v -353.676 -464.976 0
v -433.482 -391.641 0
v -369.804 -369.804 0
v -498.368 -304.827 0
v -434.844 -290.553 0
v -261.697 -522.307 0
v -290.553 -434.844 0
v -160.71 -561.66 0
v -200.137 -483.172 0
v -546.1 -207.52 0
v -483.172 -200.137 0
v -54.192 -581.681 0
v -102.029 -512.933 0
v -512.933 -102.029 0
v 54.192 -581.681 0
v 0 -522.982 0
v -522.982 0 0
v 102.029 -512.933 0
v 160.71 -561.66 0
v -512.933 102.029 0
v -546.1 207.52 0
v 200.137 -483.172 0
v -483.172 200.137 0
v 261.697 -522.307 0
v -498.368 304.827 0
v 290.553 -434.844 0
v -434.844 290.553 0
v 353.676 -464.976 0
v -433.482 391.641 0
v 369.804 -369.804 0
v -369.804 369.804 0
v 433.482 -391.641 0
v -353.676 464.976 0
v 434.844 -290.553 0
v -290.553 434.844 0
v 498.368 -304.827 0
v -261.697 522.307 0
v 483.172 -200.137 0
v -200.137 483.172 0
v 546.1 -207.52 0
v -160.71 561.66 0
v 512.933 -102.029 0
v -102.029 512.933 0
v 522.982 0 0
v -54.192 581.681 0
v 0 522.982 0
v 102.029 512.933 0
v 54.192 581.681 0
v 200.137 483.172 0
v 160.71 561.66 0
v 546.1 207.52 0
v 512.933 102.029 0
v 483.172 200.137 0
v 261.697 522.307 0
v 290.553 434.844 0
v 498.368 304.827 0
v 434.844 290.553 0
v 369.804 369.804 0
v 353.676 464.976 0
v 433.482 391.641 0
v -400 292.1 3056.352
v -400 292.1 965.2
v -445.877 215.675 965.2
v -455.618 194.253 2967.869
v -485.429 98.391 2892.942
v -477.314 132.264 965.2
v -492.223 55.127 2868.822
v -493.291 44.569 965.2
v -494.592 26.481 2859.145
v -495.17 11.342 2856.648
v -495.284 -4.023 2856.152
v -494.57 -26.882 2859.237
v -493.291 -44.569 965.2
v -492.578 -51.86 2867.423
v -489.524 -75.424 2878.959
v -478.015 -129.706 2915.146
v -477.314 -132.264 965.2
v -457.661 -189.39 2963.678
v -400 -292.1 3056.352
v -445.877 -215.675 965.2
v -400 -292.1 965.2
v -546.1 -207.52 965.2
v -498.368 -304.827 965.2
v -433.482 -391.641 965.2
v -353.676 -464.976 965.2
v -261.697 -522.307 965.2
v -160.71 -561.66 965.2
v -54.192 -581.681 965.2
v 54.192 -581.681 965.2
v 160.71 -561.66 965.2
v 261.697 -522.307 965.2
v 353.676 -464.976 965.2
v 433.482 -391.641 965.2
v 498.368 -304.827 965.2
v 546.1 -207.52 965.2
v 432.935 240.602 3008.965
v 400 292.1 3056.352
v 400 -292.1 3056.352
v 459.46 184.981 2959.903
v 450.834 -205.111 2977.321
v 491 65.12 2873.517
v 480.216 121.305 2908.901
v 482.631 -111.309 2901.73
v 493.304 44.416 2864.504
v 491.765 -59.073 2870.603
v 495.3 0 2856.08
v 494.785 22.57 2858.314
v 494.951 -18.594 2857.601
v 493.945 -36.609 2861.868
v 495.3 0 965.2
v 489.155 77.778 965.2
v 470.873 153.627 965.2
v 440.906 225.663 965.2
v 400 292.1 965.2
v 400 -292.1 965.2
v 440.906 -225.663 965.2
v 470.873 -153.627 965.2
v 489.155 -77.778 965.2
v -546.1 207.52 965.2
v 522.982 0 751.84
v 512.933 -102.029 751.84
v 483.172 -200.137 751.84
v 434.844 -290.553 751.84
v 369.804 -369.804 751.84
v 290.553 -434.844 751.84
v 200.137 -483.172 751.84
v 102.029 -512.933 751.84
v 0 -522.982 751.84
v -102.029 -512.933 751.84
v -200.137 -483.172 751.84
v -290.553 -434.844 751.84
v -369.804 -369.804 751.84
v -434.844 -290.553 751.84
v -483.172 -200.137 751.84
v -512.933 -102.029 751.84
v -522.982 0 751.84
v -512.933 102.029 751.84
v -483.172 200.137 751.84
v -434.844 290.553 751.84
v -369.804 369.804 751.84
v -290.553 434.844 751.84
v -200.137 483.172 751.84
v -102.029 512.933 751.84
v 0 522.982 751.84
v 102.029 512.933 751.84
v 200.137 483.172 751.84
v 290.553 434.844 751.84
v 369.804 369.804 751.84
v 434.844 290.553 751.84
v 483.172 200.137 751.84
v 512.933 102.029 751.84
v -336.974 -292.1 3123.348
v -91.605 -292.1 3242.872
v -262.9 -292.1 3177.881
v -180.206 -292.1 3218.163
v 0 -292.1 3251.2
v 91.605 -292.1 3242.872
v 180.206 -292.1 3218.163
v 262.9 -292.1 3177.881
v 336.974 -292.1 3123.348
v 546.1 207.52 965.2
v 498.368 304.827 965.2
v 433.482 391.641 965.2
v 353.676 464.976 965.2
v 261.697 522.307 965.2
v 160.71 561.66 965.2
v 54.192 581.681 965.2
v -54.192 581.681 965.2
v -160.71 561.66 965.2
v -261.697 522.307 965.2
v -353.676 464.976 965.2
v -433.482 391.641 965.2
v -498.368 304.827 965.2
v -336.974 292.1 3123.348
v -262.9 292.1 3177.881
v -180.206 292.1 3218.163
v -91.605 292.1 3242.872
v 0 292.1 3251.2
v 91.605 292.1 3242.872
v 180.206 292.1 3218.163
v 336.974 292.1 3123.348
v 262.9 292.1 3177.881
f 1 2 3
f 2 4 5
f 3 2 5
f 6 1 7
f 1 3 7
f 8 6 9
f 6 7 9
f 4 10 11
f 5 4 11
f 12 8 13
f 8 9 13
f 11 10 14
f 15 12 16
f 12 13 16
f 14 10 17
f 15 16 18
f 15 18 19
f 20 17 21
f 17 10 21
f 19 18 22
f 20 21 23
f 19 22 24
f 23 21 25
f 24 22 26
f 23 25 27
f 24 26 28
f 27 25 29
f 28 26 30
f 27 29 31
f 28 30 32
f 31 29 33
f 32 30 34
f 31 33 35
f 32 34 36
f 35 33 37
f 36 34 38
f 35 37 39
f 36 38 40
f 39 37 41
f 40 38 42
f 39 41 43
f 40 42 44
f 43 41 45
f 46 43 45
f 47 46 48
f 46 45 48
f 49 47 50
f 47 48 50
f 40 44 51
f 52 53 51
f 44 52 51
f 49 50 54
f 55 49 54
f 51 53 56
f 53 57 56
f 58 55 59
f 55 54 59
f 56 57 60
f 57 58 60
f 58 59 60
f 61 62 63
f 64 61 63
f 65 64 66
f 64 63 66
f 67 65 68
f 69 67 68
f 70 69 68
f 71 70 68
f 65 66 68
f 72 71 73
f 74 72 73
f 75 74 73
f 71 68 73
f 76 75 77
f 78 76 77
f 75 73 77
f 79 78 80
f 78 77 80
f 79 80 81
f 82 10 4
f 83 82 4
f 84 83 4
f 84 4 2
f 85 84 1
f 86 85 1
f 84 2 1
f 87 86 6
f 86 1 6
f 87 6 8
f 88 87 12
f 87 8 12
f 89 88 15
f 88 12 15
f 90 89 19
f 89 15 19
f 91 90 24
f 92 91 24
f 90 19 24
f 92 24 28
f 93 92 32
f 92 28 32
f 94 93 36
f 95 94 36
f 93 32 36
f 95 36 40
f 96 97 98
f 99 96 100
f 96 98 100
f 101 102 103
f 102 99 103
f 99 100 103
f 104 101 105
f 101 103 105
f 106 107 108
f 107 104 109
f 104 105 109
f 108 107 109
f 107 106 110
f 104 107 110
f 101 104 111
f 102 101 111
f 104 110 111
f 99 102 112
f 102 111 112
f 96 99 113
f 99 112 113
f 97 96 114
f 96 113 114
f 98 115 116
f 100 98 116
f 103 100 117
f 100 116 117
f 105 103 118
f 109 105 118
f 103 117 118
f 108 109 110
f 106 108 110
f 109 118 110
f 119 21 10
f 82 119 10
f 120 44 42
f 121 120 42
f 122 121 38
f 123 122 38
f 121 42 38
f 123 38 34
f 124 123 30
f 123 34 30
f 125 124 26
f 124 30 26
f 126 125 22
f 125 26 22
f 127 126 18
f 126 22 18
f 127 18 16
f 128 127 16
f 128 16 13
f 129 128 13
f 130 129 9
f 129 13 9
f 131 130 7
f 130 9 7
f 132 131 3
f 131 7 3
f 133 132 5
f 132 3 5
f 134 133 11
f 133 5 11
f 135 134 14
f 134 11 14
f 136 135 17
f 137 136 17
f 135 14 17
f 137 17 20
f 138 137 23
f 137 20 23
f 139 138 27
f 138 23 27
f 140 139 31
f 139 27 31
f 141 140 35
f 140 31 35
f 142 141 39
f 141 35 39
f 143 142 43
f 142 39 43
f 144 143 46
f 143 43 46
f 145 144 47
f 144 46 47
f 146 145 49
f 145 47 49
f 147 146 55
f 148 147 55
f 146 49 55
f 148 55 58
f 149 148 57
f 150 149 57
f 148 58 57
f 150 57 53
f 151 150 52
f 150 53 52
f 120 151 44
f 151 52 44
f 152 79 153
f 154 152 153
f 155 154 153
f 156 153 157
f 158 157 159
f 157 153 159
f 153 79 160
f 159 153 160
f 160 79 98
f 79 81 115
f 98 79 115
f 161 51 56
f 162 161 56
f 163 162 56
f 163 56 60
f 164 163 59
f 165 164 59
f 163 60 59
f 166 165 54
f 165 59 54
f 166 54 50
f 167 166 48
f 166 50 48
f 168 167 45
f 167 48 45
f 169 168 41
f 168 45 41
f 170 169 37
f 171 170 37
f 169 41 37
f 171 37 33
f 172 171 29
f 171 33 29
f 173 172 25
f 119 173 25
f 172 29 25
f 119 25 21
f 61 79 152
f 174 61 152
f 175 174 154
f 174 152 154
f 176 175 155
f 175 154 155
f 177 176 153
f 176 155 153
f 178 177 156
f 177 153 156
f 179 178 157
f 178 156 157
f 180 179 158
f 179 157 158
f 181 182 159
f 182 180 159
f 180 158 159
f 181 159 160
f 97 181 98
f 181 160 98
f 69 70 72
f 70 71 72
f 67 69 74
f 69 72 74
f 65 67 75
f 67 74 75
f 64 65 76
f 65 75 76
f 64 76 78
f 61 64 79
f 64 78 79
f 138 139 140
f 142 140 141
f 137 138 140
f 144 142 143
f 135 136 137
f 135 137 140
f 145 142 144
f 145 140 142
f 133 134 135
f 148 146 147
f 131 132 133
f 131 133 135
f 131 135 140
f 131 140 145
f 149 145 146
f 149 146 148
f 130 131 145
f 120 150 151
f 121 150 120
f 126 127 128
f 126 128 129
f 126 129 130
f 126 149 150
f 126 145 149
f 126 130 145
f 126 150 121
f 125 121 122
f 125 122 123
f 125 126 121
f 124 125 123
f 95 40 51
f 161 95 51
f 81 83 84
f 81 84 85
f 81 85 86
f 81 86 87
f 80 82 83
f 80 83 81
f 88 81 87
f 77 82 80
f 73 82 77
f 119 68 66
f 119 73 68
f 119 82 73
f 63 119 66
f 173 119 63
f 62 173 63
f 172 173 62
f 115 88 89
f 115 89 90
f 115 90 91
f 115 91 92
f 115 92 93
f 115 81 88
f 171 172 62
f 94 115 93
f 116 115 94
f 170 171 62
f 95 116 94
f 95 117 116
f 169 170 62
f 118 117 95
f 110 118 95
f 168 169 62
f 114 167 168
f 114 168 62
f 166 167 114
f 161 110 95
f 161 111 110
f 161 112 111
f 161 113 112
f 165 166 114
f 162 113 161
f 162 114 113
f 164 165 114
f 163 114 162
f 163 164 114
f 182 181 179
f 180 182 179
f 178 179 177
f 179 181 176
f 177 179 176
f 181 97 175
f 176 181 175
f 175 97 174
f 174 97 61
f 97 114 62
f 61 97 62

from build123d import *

# Parameters (mm, degrees)
F1_DEPTH = 965.2
F3_DEPTH = 2362.2
F5_DEPTH = 1524
F6_R     = 522.982092
F7_DEPTH = 751.84


with BuildPart() as f1:
    # F0 (on Top) → F1 (new body)
    with BuildSketch(Plane.XY):
        with BuildLine():
            Line((546.1, -207.51971), (546.1, 207.51971))
            ThreePointArc((546.1, 207.51971), (0, 584.2), (-546.1, 207.51971))
            Line((-546.1, 207.51971), (-546.1, -207.51971))
            ThreePointArc((-546.1, -207.51971), (0, -584.2), (546.1, -207.51971))
        make_face()
    extrude(amount=F1_DEPTH)

    # F2 (on face) → F3 (join)
    with BuildSketch(Plane.XY.offset(965.2)):
        with BuildLine():
            ThreePointArc((399.9996, -292.1), (470.872537, -153.626639), (495.3, 0))
            ThreePointArc((495.3, 0), (470.872537, 153.626639), (399.9996, 292.1))
            Line((399.9996, 292.1), (-399.9996, 292.1))
            ThreePointArc((-399.9996, 292.1), (-495.3, 0), (-399.9996, -292.1))
            Line((-399.9996, -292.1), (399.9996, -292.1))
        make_face()
    extrude(amount=F3_DEPTH)

    # F4 (on face) → F5 (cut)
    with BuildSketch(Plane.XZ.offset(292.1)):
        with BuildLine():
            ThreePointArc((508, 2743.2), (507.982015, 2738.925396), (507.928062, 2734.651095))
            Line((507.928062, 2734.651095), (693.923891, 3608.874083))
            Line((693.923891, 3608.874083), (-619.614959, 3534.225464))
            Line((-619.614959, 3534.225464), (-506.015009, 2788.064354))
            ThreePointArc((-506.015009, 2788.064354), (-472.451283, 2929.891686), (-399.9996, 3056.352231))
            Line((-399.9996, 3056.352231), (-399.9996, 3327.4))
            Line((-399.9996, 3327.4), (399.9996, 3327.4))
            Line((399.9996, 3327.4), (399.9996, 3056.352231))
            ThreePointArc((399.9996, 3056.352231), (480.2415, 2908.826392), (508, 2743.2))
        make_face()
        with BuildLine():
            ThreePointArc((-399.9996, 3056.352231), (0, 3251.2), (399.9996, 3056.352231))
            Line((399.9996, 3056.352231), (399.9996, 3327.4))
            Line((399.9996, 3327.4), (-399.9996, 3327.4))
            Line((-399.9996, 3327.4), (-399.9996, 3056.352231))
        make_face()
    extrude(amount=-F5_DEPTH, mode=Mode.SUBTRACT)

    # F6 (on face) → F7 (cut)
    with BuildSketch(Plane(origin=(0, 0, 0), x_dir=(1, 0, 0), z_dir=(0, 0, -1))):
        Circle(F6_R)
    extrude(amount=-F7_DEPTH, mode=Mode.SUBTRACT)


solid = f1.part
